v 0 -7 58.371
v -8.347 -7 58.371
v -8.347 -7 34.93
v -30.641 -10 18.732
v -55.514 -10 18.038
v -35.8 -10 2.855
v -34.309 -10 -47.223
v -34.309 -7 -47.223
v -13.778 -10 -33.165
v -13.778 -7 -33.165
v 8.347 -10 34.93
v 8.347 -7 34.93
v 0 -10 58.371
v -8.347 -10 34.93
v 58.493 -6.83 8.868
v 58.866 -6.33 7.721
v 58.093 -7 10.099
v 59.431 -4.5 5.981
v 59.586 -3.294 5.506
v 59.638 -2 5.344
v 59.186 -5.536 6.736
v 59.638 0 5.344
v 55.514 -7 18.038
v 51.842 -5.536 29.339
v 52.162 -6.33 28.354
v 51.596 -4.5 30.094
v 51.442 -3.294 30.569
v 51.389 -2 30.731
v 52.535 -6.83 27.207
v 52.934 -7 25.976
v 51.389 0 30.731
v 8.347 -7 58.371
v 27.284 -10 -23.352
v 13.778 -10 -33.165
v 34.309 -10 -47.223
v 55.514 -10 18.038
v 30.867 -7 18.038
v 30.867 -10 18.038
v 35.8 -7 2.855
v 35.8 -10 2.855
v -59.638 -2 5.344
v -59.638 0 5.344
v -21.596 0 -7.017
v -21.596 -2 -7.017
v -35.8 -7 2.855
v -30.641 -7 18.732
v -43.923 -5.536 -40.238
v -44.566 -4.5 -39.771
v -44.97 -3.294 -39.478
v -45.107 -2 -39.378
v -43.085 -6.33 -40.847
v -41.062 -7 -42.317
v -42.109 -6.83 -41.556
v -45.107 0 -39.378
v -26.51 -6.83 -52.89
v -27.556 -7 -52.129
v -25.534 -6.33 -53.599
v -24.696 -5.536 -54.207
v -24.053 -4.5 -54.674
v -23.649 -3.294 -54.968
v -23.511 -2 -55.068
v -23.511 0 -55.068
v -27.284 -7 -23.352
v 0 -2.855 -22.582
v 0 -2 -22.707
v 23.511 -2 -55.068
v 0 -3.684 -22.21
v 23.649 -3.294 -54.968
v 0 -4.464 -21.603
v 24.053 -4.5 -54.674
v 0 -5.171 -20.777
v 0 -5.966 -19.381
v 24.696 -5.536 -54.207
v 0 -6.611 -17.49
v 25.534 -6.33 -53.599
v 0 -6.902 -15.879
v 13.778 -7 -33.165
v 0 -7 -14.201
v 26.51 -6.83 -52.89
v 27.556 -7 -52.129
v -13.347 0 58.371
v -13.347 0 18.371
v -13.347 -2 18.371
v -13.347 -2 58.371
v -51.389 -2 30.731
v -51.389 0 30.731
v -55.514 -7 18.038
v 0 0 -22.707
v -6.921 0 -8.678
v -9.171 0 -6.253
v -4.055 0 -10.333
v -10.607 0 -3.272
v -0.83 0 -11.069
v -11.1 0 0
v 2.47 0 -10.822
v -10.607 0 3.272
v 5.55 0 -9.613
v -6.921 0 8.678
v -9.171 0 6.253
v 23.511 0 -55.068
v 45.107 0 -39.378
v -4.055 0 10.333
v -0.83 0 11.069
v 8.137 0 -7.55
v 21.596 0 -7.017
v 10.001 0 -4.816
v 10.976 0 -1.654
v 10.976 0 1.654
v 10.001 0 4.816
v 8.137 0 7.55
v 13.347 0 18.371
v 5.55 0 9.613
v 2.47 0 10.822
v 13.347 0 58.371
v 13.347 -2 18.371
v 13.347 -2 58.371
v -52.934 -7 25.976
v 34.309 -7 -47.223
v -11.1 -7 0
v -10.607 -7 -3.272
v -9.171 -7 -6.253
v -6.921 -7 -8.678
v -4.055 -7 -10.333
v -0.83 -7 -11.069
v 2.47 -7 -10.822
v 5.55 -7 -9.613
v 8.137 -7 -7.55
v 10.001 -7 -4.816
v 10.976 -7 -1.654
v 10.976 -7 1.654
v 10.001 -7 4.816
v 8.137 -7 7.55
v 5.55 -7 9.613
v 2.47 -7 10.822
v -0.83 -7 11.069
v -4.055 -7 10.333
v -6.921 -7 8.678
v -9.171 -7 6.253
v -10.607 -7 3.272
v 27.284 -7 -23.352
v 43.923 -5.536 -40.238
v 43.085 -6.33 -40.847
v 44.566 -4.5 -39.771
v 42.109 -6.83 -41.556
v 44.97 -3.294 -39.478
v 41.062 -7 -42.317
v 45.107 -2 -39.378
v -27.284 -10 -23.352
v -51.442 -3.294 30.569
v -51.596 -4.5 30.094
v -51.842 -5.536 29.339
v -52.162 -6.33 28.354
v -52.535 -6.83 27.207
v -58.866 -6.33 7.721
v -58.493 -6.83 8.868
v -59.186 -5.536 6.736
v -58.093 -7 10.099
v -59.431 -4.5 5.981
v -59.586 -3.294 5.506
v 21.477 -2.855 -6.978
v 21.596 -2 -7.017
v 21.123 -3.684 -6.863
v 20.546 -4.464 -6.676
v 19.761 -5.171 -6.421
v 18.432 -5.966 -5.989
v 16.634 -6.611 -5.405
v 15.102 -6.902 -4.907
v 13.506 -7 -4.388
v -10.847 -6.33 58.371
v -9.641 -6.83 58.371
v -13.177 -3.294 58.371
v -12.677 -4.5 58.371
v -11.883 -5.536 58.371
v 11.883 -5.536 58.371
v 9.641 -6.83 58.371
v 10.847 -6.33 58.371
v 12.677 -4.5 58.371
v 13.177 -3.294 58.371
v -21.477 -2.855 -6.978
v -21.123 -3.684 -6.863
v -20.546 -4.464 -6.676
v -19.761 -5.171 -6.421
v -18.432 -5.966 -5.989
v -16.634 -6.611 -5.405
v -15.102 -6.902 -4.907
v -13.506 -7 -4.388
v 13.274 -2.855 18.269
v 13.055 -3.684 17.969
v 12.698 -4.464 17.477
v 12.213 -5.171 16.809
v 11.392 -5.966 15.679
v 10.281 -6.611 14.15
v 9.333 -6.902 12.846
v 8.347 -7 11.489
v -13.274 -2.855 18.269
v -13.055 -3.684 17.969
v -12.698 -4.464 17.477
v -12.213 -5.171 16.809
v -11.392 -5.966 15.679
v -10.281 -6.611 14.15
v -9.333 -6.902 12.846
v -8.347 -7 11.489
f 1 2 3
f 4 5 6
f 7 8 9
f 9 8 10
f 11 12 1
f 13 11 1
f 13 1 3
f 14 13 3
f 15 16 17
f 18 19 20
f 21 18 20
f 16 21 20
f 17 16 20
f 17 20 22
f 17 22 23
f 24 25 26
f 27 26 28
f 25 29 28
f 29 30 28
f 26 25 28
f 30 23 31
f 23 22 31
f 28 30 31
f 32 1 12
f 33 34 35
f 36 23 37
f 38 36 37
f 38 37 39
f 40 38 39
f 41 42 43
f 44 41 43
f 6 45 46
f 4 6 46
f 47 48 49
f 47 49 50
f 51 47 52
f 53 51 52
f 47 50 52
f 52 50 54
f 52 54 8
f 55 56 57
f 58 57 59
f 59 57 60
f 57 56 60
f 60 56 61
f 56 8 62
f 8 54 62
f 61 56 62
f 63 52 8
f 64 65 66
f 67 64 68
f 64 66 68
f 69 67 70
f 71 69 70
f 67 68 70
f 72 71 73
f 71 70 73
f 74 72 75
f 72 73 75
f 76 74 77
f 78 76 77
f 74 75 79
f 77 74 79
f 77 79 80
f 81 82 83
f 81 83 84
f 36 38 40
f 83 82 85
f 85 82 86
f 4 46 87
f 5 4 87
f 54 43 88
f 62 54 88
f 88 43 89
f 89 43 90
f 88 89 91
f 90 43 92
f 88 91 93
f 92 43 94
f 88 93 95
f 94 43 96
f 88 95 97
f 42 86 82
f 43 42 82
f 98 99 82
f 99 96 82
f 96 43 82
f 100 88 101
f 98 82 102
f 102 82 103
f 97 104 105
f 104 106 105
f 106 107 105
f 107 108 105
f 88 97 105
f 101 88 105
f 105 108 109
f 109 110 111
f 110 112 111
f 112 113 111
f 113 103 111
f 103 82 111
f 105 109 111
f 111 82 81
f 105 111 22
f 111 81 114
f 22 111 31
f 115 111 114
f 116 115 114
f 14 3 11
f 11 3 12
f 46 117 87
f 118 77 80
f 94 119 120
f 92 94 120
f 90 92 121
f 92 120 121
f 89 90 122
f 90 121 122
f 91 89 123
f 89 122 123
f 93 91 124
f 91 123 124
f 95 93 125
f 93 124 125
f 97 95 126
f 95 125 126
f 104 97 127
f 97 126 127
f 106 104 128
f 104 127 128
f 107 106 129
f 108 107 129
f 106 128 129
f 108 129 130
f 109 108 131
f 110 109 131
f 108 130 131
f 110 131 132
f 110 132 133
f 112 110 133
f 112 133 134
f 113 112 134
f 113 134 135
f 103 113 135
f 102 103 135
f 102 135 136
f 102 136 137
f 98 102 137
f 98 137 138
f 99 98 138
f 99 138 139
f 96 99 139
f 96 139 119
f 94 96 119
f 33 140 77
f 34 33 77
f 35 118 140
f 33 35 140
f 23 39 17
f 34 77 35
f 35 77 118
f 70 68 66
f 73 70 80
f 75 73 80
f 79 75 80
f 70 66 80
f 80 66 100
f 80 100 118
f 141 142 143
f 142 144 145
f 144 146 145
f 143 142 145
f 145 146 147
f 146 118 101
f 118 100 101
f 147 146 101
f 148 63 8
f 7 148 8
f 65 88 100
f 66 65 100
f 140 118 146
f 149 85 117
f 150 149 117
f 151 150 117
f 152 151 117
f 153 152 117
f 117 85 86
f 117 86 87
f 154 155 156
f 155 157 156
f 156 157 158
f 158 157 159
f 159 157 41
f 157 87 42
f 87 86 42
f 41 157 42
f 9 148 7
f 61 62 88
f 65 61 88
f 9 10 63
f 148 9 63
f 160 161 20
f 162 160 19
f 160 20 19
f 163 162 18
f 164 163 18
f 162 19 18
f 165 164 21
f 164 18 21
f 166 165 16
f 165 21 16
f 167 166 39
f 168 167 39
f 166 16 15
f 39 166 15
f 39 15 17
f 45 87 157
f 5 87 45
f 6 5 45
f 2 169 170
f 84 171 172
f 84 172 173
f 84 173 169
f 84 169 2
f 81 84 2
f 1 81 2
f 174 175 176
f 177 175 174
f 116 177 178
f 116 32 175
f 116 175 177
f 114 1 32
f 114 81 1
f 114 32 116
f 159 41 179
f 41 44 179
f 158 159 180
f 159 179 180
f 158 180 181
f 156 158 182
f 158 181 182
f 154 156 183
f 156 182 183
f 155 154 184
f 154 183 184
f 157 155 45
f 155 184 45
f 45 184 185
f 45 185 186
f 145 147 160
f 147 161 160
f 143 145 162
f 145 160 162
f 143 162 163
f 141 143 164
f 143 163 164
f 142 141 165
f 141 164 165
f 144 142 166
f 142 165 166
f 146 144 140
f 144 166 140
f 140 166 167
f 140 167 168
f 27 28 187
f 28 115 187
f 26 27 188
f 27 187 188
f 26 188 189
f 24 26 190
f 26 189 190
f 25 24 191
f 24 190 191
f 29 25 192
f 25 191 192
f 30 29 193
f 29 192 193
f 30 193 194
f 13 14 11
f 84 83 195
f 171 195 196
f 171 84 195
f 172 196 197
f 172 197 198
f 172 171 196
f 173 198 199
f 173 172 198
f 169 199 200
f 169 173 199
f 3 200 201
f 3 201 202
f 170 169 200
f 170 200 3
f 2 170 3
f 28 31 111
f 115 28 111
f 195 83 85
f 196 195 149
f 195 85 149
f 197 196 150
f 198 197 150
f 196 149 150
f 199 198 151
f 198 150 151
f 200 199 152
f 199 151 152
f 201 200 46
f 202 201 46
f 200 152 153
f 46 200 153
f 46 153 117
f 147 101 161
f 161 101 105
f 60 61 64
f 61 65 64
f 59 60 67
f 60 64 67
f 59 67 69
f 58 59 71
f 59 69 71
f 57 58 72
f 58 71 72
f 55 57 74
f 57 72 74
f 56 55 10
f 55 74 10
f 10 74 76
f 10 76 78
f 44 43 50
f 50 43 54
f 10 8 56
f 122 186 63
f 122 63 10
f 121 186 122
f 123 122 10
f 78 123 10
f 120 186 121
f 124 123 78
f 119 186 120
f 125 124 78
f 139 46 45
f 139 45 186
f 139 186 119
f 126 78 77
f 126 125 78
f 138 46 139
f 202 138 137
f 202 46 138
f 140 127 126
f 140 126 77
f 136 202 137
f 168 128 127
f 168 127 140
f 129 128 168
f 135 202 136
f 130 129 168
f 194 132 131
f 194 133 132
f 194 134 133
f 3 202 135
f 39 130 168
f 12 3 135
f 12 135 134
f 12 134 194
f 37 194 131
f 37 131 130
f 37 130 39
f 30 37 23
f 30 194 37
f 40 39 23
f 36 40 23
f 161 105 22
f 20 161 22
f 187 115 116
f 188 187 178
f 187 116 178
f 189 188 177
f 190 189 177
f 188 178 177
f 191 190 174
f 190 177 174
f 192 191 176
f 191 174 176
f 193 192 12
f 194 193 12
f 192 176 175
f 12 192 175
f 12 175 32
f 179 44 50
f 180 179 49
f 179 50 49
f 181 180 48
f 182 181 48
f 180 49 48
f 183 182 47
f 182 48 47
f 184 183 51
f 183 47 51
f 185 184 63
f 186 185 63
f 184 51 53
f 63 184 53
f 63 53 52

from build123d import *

# Parameters (mm, degrees)
F0_W     = 26.6942243119
F0_H     = 40
F1_DEPTH = 7
F2_R     = 5
F4_DEPTH = 3
F6_D     = 22.2
F6_DEPTH = 20
F6_TIP   = 6.6695528712


with BuildPart() as f1:
    # F0 (on Front) → F1 (new body)
    with BuildSketch(Plane.XZ):
        Polygon((-23.5114100917, -55.0681432643), (0, -22.7074634893), (-21.59608112, -7.0169921173), (-45.1074912117, -39.3776718923), align=None)
        Polygon((-21.59608112, -7.0169921173), (0, -22.7074634893), (21.59608112, -7.0169921173), (13.347112156, 18.370723862), (-13.347112156, 18.370723862), align=None)
        Polygon((21.59608112, -7.0169921173), (0, -22.7074634893), (23.5114100917, -55.0681432643), (45.1074912117, -39.3776718923), align=None)
        Polygon((-59.6383417718, 5.3436876577), (-21.59608112, -7.0169921173), (-13.347112156, 18.370723862), (-51.3893728078, 30.731403637), align=None)
        Polygon((13.347112156, 18.370723862), (21.59608112, -7.0169921173), (59.6383417718, 5.3436876577), (51.3893728078, 30.731403637), align=None)
        with Locations((0, 38.370723862)):
            Rectangle(F0_W, F0_H)
    extrude(amount=F1_DEPTH)

    # F2
    f2_edges = [f1.edges().sort_by_distance(p)[0] for p in [
        (-40.617211, -7, -0.836652),
        (-32.368242, -7, 24.551064),
        (-11.755705, -7, -38.887803),
        (40.617211, -7, -0.836652),
        (-33.351786, -7, -23.197332),
        (33.351786, -7, -23.197332),
        (11.755705, -7, -38.887803),
        (32.368242, -7, 24.551064),
        (13.347112, -7, 38.370724),
        (-13.347112, -7, 38.370724),
    ]]
    fillet(f2_edges, radius=F2_R)

    # F3 (on face) → F4 (join)
    with BuildSketch(Plane.XZ.offset(7)):
        Polygon((-55.5138572898, 18.0375456473), (-35.7995839881, 2.8553168412), (-30.6407849678, 18.7324676575), align=None)
        Polygon((0, 58.370723862), (-8.347112156, 34.9297690608), (8.347112156, 34.9297690608), align=None)
        Polygon((55.5138572898, 18.0375456473), (30.8665788163, 18.0375456473), (35.7995839881, 2.8553168412), align=None)
        Polygon((27.284158708, -23.3524673553), (13.7782475318, -33.1650862043), (34.3094506517, -47.2229075783), align=None)
        Polygon((-13.7782475318, -33.1650862043), (-27.284158708, -23.3524673553), (-34.3094506517, -47.2229075783), align=None)
    extrude(amount=F4_DEPTH)

    # F6
    with Locations(Plane(origin=(0, 0, 0), x_dir=(1, 0, 0), z_dir=(0, 1, 0))):
        with Locations((0, 0)):
            Hole(F6_D / 2, depth=F6_DEPTH)
            with Locations((0, 0, -(F6_DEPTH + F6_TIP / 2))):  # 118° drill point
                Cone(0, F6_D / 2, F6_TIP, mode=Mode.SUBTRACT)


solid = f1.part
